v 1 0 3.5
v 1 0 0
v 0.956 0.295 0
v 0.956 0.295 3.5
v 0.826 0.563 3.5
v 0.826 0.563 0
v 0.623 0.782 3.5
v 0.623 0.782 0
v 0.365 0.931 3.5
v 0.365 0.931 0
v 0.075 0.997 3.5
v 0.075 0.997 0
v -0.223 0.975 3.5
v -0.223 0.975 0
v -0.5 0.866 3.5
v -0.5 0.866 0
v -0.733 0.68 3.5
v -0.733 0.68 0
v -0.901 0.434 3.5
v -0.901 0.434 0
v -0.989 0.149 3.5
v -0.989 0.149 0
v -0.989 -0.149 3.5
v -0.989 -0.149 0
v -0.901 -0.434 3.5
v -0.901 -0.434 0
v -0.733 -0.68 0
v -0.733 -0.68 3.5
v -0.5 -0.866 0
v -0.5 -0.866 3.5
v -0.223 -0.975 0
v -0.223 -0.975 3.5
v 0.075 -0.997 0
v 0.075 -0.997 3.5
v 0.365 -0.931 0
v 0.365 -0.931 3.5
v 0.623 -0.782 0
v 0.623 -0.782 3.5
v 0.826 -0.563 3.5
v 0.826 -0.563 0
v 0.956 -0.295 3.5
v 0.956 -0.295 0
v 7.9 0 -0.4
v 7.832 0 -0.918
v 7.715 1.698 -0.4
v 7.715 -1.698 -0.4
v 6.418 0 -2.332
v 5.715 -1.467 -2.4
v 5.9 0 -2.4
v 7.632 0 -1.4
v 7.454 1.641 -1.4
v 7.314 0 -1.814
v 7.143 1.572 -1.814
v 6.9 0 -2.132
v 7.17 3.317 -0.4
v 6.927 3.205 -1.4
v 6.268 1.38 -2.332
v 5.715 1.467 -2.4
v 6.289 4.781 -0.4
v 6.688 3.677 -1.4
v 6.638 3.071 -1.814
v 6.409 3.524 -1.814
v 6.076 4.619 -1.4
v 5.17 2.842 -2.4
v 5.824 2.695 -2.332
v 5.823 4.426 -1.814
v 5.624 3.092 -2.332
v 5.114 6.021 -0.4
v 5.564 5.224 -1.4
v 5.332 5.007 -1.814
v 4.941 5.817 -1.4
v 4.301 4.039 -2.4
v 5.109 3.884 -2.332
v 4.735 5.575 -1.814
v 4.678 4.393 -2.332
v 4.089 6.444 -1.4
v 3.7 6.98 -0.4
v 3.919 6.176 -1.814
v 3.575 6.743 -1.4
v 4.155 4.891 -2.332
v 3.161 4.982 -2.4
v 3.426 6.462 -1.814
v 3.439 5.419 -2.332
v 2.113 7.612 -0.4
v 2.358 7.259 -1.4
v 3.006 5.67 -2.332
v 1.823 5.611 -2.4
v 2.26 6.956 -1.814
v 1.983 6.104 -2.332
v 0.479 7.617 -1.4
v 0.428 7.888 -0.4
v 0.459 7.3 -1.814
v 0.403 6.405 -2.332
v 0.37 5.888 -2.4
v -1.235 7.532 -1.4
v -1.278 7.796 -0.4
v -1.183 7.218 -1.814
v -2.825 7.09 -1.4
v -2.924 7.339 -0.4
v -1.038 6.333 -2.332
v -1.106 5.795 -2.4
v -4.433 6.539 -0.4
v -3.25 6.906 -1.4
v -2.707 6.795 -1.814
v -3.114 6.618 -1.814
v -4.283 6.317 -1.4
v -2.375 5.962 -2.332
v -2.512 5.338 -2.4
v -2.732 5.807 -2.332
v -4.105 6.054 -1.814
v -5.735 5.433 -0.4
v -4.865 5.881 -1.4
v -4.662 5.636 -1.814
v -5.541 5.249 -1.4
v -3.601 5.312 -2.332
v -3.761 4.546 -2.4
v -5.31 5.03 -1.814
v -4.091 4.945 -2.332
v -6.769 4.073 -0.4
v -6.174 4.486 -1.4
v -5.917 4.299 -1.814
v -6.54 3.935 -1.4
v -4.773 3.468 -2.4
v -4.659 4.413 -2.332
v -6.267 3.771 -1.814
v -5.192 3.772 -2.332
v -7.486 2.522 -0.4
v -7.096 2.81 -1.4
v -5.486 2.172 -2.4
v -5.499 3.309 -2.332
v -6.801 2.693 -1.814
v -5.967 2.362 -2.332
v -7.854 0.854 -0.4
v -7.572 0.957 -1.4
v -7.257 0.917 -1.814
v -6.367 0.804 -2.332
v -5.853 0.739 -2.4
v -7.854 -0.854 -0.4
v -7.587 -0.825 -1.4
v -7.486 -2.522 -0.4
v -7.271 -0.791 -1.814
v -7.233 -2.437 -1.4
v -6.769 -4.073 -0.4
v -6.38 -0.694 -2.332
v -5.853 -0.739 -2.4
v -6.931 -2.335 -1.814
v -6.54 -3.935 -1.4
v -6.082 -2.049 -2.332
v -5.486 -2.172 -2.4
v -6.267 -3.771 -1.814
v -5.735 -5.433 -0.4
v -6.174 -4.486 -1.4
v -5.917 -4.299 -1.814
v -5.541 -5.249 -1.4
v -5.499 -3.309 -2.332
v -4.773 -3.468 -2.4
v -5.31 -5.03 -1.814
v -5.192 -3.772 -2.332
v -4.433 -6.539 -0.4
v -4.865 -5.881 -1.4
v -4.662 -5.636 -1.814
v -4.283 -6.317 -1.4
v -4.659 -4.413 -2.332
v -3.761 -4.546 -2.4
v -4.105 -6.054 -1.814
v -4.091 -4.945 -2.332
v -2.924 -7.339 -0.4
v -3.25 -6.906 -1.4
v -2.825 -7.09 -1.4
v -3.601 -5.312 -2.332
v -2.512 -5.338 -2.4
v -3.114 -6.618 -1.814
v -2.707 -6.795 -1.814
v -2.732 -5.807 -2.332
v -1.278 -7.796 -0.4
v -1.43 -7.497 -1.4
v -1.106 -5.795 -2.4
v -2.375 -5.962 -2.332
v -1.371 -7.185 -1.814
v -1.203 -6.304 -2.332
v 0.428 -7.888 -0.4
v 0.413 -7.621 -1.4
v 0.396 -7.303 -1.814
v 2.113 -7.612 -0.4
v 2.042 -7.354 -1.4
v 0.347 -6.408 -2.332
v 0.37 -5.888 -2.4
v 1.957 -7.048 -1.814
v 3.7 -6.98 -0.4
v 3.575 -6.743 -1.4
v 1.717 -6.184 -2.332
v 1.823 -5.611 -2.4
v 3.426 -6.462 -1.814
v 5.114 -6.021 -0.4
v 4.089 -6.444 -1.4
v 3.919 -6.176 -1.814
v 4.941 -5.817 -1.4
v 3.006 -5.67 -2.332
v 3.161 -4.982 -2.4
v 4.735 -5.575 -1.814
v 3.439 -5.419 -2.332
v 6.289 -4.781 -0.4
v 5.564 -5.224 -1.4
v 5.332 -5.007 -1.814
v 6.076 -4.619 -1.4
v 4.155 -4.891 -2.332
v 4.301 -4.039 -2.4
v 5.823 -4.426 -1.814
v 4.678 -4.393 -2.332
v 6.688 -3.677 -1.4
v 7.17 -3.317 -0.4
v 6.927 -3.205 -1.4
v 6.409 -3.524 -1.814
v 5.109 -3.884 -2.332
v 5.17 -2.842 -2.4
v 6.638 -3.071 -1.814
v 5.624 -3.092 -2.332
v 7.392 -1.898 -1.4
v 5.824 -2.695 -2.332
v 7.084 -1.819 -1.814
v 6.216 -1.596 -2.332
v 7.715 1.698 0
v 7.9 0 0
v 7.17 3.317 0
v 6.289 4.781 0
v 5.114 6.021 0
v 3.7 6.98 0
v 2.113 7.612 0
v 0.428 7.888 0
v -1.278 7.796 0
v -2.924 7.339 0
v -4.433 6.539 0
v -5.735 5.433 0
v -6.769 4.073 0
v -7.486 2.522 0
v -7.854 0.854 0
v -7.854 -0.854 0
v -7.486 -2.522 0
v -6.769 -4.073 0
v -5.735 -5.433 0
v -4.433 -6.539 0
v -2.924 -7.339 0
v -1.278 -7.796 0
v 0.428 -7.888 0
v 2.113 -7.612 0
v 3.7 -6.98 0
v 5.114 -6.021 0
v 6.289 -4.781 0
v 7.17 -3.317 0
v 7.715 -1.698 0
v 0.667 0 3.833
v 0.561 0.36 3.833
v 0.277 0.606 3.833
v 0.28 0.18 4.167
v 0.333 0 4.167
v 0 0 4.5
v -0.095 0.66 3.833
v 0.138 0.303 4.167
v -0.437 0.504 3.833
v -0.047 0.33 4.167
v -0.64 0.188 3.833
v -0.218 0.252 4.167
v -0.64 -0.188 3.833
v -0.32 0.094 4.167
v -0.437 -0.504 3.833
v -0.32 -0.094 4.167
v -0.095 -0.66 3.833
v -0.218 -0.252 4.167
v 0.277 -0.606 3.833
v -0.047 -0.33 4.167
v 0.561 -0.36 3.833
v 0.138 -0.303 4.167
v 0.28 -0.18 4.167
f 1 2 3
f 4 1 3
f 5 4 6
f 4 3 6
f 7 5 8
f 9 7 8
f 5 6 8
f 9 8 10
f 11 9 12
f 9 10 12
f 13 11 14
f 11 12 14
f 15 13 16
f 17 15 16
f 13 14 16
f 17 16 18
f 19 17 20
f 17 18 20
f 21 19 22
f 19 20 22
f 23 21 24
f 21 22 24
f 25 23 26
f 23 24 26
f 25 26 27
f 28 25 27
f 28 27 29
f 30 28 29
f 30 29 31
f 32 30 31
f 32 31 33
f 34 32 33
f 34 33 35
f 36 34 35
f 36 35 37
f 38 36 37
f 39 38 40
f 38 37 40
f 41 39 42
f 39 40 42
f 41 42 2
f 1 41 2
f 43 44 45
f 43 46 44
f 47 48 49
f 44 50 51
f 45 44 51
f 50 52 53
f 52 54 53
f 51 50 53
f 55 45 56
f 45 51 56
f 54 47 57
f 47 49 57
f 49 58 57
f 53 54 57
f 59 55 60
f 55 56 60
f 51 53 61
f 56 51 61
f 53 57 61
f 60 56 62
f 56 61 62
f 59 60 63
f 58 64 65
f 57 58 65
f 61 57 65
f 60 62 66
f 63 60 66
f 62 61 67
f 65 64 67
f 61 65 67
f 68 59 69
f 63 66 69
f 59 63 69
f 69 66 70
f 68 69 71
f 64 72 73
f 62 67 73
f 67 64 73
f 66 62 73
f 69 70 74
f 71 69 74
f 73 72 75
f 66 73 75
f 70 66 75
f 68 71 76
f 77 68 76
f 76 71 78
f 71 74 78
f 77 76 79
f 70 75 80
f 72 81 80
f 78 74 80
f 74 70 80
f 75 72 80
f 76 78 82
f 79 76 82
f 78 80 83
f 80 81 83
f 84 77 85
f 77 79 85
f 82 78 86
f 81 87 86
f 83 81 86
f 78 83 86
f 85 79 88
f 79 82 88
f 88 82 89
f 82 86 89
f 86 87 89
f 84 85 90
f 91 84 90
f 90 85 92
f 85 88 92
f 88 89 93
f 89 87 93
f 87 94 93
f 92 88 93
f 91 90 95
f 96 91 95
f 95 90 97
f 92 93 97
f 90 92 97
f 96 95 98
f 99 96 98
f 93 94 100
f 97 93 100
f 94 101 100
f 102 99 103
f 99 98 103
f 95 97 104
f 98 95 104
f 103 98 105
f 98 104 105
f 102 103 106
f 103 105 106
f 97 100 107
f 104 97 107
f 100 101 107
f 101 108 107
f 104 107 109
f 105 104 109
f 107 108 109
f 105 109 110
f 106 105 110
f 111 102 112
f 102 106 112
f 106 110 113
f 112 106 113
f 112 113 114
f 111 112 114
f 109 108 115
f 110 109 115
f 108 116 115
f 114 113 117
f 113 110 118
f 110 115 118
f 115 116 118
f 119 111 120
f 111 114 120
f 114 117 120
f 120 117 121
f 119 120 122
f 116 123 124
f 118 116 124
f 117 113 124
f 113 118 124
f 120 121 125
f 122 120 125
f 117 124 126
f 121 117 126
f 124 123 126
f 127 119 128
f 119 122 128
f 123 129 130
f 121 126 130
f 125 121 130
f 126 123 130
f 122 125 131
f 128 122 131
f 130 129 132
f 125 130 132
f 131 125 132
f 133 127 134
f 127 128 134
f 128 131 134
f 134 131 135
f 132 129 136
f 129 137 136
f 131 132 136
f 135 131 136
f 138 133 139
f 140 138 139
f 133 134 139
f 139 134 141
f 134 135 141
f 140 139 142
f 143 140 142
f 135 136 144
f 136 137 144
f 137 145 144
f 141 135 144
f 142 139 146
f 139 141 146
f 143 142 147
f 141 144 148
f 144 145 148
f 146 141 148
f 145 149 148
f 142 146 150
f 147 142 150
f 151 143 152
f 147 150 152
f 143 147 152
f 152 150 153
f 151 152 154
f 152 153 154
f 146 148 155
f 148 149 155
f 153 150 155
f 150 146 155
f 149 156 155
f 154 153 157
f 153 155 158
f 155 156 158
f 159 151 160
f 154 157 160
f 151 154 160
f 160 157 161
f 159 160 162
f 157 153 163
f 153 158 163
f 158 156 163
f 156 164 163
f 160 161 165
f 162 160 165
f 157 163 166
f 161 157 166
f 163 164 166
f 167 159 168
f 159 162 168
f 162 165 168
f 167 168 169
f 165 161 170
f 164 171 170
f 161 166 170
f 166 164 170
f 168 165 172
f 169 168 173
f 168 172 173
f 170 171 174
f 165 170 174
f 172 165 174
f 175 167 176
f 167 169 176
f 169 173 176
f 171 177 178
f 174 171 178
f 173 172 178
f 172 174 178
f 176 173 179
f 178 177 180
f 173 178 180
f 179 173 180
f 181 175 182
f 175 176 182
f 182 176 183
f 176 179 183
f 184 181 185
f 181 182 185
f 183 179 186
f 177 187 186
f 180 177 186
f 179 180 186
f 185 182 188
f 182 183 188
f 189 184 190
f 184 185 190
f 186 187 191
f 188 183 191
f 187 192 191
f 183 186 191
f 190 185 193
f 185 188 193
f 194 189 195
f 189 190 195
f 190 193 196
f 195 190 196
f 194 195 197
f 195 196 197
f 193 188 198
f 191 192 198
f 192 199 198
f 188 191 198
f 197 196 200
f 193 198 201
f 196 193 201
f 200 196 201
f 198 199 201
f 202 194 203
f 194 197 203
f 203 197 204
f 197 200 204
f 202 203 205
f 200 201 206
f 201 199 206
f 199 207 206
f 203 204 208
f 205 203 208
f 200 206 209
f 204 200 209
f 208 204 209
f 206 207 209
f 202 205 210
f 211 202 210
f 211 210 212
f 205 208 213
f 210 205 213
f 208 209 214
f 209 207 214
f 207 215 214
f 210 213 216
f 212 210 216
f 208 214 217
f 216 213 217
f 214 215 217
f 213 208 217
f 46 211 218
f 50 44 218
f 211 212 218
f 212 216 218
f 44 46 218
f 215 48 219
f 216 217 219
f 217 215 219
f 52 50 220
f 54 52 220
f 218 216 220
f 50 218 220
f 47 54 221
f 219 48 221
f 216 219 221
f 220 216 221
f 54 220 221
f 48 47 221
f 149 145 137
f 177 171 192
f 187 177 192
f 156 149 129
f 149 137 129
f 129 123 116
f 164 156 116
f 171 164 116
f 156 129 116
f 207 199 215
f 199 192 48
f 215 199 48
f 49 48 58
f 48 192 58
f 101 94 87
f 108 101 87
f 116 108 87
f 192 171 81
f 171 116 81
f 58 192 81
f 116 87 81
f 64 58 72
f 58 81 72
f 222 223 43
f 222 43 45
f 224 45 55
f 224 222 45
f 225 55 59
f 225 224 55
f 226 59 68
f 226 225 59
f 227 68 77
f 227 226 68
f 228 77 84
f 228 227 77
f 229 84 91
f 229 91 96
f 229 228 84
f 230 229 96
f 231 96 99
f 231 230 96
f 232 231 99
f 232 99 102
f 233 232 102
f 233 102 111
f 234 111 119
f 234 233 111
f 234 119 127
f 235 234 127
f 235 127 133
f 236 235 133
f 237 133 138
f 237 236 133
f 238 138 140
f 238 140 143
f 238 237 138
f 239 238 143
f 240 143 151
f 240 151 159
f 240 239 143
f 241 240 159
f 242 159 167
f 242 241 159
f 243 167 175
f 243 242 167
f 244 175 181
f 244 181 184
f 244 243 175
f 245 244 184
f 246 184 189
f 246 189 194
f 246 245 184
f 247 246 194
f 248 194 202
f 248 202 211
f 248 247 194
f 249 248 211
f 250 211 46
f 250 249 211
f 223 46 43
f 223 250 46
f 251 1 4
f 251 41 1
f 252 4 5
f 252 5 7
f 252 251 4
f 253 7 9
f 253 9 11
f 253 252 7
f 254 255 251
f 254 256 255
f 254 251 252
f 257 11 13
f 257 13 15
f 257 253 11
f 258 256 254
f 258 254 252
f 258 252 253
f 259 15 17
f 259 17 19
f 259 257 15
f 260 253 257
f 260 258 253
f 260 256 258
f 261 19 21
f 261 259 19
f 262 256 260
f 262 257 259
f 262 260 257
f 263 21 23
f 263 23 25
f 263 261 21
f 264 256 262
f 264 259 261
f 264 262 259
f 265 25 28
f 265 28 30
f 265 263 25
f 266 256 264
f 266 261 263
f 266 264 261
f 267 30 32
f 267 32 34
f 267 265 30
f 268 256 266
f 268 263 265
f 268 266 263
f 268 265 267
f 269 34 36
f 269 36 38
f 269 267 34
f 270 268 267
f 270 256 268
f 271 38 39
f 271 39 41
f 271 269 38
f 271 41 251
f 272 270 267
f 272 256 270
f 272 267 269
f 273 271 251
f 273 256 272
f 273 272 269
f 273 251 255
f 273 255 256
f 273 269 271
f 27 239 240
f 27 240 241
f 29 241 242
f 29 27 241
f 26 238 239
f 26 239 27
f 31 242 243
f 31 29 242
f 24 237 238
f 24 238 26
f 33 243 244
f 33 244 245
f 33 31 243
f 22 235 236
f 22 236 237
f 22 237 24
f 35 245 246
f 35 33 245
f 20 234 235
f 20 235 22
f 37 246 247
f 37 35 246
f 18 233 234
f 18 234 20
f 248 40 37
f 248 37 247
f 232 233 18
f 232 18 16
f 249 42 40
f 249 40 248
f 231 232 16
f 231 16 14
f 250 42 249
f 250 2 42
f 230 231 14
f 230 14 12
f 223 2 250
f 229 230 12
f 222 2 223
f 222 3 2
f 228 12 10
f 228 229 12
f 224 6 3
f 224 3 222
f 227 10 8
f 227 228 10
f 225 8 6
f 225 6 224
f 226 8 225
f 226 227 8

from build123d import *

# Parameters (mm, degrees)
F0_R     = 7.9
F1_DEPTH = 2.4
F2_R     = 1
F3_DEPTH = 4.5
F4_R     = 2
F5_SIZE  = 1


with BuildPart() as f1:
    # F0 (on Top) → F1 (new body)
    with BuildSketch(Plane.XY):
        Circle(F0_R)
    extrude(amount=-F1_DEPTH)

    # F2 (on face) → F3 (join)
    with BuildSketch(Plane.XY):
        Circle(F2_R)
    extrude(amount=F3_DEPTH)

    # F4
    f4_edges = [f1.edges().sort_by_distance(p)[0] for p in [
        (-7.9, 0, -2.4),
    ]]
    fillet(f4_edges, radius=F4_R)

    # F5
    f5_edges = [f1.edges().sort_by_distance(p)[0] for p in [
        (-1, 0, 4.5),
    ]]
    chamfer(f5_edges, length=F5_SIZE)


solid = f1.part
